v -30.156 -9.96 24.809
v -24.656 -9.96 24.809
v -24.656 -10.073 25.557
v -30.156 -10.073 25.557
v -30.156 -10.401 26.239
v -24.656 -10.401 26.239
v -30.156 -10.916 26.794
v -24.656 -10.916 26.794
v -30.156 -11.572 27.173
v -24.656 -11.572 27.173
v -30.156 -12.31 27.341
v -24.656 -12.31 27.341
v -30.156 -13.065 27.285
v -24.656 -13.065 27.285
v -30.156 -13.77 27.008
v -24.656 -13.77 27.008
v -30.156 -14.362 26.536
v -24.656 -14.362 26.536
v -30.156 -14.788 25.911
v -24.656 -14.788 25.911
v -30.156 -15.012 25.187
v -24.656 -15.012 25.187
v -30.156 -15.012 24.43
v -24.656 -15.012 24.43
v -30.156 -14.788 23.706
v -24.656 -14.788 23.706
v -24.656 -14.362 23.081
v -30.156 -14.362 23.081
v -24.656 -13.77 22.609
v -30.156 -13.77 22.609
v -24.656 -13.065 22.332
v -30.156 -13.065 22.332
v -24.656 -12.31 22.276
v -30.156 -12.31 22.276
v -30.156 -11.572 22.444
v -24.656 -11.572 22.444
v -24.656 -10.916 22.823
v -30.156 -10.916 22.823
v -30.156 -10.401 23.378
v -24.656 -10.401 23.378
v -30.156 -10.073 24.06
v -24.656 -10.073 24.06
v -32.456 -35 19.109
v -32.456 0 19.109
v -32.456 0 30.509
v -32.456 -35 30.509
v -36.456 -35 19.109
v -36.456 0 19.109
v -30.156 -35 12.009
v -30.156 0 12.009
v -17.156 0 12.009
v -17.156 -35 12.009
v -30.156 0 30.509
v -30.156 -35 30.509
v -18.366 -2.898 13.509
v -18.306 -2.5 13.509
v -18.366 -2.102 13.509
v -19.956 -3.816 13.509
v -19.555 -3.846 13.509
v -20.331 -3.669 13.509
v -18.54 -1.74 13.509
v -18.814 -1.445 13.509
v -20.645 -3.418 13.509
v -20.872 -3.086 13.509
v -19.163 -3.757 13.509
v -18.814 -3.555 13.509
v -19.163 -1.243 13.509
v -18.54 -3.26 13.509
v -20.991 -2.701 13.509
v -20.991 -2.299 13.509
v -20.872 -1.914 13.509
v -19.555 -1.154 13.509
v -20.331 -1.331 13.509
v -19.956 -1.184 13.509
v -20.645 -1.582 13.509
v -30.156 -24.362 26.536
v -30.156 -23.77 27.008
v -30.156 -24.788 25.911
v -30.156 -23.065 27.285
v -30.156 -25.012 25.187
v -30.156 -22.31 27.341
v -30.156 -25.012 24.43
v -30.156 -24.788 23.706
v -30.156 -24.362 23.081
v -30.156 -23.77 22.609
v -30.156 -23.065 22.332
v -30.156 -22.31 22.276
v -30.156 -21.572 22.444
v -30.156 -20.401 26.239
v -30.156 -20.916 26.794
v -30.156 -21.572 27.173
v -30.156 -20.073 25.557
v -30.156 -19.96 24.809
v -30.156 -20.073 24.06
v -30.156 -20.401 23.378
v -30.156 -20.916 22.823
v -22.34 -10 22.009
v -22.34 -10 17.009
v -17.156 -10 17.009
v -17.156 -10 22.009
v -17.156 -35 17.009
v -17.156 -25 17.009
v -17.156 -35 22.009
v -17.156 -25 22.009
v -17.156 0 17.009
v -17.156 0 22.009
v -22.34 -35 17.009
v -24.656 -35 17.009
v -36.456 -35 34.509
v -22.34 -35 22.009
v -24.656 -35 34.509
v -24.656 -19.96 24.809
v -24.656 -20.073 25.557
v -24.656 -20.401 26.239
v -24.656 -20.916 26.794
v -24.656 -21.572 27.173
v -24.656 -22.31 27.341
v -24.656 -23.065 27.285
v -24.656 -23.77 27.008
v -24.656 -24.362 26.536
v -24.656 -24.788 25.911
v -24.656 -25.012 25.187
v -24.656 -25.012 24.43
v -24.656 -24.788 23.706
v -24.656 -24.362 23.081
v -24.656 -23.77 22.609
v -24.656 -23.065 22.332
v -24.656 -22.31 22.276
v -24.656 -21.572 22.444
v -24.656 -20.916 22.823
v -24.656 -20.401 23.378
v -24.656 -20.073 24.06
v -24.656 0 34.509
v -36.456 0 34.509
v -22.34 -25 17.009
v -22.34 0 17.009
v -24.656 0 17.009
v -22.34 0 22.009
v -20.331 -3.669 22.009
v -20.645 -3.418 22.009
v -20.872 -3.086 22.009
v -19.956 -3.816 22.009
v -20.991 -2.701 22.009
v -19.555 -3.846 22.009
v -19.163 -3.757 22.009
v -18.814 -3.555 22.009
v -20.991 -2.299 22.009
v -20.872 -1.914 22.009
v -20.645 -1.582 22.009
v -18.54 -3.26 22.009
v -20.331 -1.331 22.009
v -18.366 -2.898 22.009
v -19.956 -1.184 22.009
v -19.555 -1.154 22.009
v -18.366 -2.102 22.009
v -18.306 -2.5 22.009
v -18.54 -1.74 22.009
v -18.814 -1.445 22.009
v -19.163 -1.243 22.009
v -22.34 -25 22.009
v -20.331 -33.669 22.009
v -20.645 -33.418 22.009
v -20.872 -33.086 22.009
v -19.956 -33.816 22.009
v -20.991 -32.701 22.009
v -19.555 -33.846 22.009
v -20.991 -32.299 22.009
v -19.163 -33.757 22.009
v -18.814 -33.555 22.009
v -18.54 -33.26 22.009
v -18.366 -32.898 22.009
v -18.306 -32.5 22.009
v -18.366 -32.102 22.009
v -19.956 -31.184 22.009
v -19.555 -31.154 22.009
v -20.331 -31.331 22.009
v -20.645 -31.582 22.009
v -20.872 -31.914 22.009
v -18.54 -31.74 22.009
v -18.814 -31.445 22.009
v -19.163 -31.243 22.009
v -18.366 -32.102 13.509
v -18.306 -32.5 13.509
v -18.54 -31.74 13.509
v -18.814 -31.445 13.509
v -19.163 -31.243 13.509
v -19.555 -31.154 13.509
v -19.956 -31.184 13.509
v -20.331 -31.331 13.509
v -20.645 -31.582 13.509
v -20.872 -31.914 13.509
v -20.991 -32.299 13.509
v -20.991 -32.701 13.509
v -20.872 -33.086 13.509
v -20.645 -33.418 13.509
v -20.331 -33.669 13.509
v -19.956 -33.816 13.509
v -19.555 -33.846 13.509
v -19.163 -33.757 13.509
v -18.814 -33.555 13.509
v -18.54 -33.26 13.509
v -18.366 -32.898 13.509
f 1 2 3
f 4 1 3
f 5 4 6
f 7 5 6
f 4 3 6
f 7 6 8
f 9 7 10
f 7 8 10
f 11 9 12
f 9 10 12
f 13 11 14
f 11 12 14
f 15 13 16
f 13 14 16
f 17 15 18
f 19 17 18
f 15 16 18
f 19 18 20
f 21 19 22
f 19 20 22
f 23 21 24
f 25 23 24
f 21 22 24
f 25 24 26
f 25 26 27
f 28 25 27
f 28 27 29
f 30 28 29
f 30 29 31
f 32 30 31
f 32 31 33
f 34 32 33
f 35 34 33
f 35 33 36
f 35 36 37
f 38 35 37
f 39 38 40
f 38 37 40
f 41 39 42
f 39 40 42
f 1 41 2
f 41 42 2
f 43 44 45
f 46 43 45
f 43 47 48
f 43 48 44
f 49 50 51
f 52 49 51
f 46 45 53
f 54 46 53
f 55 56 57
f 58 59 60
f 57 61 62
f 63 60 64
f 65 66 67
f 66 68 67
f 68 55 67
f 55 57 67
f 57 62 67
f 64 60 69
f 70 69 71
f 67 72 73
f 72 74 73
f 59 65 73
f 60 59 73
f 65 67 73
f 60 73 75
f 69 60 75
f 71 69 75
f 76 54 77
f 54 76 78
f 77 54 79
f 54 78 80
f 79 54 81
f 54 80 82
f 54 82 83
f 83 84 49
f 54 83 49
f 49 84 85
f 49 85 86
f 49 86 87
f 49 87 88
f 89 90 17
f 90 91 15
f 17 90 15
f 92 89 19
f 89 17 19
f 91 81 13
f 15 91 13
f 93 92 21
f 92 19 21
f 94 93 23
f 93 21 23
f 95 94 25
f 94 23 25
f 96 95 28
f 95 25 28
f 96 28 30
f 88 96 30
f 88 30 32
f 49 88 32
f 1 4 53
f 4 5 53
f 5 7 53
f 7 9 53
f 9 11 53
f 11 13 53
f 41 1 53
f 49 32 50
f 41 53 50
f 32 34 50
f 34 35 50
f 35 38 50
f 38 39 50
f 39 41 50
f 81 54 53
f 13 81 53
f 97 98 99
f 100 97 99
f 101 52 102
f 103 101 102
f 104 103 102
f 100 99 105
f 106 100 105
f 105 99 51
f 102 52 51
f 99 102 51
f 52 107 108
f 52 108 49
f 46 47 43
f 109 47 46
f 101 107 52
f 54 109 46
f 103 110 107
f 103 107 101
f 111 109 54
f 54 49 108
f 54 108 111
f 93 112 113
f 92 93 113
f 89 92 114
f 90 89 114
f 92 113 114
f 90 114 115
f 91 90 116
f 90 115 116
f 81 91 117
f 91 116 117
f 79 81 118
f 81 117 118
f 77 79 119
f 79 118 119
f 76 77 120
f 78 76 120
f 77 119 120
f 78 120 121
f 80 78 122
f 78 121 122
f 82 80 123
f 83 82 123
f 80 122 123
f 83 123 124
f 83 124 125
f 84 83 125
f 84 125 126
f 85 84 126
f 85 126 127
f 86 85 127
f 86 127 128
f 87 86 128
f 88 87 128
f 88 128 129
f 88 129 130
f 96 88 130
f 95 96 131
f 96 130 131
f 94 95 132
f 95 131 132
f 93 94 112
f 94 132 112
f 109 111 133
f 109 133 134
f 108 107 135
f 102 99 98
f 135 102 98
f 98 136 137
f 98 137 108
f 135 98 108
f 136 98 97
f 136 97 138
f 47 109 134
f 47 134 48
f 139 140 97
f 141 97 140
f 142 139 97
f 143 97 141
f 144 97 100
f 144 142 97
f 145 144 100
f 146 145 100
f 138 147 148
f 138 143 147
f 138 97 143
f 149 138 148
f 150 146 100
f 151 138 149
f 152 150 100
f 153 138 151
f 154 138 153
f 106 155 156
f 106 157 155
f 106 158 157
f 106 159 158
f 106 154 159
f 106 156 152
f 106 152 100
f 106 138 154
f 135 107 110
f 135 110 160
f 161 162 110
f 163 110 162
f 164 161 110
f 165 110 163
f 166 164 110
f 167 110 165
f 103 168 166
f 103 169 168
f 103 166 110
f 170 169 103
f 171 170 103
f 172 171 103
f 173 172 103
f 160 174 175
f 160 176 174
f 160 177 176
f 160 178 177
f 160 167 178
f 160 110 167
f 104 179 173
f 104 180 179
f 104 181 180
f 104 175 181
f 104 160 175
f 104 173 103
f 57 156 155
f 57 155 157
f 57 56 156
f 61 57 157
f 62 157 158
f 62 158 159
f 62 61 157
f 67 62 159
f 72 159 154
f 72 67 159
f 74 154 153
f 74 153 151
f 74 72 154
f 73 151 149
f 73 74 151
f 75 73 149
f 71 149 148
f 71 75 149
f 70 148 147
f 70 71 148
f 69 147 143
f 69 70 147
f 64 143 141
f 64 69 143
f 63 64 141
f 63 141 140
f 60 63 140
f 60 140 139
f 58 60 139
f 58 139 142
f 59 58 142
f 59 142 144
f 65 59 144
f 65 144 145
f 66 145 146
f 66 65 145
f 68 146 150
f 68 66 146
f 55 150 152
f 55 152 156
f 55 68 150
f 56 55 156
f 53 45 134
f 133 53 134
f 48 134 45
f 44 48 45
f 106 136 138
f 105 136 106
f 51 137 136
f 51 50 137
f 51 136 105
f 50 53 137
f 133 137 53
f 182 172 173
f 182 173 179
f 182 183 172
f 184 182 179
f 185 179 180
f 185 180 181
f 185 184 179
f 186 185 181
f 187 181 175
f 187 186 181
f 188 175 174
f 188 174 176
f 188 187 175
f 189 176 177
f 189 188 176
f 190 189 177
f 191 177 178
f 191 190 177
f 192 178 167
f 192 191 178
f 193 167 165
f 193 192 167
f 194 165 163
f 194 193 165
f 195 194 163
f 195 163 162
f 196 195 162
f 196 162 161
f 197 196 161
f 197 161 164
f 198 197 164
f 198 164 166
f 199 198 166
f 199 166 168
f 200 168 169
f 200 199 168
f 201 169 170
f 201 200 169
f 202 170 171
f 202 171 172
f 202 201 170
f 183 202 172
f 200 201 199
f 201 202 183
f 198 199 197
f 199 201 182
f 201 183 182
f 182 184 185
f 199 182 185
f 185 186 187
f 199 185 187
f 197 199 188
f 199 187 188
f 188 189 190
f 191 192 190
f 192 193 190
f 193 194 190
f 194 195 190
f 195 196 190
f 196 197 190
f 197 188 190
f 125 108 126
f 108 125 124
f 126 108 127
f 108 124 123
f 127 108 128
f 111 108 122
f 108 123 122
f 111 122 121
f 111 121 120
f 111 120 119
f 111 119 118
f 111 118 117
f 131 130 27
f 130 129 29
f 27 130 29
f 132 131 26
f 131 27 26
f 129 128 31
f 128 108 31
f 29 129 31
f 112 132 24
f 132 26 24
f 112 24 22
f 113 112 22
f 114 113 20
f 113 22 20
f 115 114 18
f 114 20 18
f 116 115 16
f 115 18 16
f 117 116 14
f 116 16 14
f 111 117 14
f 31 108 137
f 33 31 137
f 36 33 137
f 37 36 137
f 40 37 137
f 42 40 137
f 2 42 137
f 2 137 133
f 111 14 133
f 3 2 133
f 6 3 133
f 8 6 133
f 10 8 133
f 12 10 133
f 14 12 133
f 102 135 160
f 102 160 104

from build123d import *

# Parameters (mm, degrees)
F1_DEPTH = 35
F2_W     = 5.1841197739
F2_H     = 10
F2_R     = 1.35
F3_DEPTH = 5
F4_R     = 2.54
F5_DEPTH = 5.5
F6_DEPTH = 3.5


with BuildPart() as f1:
    # F0 (on Front) → F1 (new body)
    with BuildSketch(Plane.XZ):
        Polygon((-36.4558147092, 34.5085331884), (-36.4558147092, 19.1085331884), (-32.4558147092, 19.1085331884), (-32.4558147092, 30.5085331884), (-30.1558147092, 30.5085331884), (-30.1558147092, 12.0085331884), (-17.1558147092, 12.0085331884), (-17.1558147092, 17.0085331884), (-24.6558147092, 17.0085331884), (-24.6558147092, 34.5085331884), align=None)
    extrude(amount=F1_DEPTH)

    # F2 (on face) → F3 (join)
    with BuildSketch(Plane.XY.offset(17.0085331884)):
        with Locations((-19.7478745962, -5)):
            Rectangle(F2_W, F2_H)
        with Locations((-19.6558147092, -2.5)):
            Circle(F2_R, mode=Mode.SUBTRACT)
        with Locations((-19.7478745962, -30)):
            Rectangle(F2_W, F2_H)
        with Locations((-19.6558147092, -32.5)):
            Circle(F2_R, mode=Mode.SUBTRACT)
    extrude(amount=F3_DEPTH)

    # F4 (on face) → F5 (cut, through all)
    with BuildSketch(Plane.YZ.offset(-24.6558147092)):
        with Locations((-22.5, 24.8085331884)):
            Circle(F4_R)
        with Locations((-12.5, 24.8085331884)):
            Circle(F4_R)
    extrude(amount=-F5_DEPTH, mode=Mode.SUBTRACT)

    # F6 (cut): faces of the model
    f6_faces = [f1.faces().sort_by_distance(p)[0] for p in [
        (-19.6558147092, -32.5, 17.0085331884),
        (-19.6558147092, -2.5, 17.0085331884),
    ]]
    extrude(f6_faces, amount=-F6_DEPTH, mode=Mode.SUBTRACT)


solid = f1.part
